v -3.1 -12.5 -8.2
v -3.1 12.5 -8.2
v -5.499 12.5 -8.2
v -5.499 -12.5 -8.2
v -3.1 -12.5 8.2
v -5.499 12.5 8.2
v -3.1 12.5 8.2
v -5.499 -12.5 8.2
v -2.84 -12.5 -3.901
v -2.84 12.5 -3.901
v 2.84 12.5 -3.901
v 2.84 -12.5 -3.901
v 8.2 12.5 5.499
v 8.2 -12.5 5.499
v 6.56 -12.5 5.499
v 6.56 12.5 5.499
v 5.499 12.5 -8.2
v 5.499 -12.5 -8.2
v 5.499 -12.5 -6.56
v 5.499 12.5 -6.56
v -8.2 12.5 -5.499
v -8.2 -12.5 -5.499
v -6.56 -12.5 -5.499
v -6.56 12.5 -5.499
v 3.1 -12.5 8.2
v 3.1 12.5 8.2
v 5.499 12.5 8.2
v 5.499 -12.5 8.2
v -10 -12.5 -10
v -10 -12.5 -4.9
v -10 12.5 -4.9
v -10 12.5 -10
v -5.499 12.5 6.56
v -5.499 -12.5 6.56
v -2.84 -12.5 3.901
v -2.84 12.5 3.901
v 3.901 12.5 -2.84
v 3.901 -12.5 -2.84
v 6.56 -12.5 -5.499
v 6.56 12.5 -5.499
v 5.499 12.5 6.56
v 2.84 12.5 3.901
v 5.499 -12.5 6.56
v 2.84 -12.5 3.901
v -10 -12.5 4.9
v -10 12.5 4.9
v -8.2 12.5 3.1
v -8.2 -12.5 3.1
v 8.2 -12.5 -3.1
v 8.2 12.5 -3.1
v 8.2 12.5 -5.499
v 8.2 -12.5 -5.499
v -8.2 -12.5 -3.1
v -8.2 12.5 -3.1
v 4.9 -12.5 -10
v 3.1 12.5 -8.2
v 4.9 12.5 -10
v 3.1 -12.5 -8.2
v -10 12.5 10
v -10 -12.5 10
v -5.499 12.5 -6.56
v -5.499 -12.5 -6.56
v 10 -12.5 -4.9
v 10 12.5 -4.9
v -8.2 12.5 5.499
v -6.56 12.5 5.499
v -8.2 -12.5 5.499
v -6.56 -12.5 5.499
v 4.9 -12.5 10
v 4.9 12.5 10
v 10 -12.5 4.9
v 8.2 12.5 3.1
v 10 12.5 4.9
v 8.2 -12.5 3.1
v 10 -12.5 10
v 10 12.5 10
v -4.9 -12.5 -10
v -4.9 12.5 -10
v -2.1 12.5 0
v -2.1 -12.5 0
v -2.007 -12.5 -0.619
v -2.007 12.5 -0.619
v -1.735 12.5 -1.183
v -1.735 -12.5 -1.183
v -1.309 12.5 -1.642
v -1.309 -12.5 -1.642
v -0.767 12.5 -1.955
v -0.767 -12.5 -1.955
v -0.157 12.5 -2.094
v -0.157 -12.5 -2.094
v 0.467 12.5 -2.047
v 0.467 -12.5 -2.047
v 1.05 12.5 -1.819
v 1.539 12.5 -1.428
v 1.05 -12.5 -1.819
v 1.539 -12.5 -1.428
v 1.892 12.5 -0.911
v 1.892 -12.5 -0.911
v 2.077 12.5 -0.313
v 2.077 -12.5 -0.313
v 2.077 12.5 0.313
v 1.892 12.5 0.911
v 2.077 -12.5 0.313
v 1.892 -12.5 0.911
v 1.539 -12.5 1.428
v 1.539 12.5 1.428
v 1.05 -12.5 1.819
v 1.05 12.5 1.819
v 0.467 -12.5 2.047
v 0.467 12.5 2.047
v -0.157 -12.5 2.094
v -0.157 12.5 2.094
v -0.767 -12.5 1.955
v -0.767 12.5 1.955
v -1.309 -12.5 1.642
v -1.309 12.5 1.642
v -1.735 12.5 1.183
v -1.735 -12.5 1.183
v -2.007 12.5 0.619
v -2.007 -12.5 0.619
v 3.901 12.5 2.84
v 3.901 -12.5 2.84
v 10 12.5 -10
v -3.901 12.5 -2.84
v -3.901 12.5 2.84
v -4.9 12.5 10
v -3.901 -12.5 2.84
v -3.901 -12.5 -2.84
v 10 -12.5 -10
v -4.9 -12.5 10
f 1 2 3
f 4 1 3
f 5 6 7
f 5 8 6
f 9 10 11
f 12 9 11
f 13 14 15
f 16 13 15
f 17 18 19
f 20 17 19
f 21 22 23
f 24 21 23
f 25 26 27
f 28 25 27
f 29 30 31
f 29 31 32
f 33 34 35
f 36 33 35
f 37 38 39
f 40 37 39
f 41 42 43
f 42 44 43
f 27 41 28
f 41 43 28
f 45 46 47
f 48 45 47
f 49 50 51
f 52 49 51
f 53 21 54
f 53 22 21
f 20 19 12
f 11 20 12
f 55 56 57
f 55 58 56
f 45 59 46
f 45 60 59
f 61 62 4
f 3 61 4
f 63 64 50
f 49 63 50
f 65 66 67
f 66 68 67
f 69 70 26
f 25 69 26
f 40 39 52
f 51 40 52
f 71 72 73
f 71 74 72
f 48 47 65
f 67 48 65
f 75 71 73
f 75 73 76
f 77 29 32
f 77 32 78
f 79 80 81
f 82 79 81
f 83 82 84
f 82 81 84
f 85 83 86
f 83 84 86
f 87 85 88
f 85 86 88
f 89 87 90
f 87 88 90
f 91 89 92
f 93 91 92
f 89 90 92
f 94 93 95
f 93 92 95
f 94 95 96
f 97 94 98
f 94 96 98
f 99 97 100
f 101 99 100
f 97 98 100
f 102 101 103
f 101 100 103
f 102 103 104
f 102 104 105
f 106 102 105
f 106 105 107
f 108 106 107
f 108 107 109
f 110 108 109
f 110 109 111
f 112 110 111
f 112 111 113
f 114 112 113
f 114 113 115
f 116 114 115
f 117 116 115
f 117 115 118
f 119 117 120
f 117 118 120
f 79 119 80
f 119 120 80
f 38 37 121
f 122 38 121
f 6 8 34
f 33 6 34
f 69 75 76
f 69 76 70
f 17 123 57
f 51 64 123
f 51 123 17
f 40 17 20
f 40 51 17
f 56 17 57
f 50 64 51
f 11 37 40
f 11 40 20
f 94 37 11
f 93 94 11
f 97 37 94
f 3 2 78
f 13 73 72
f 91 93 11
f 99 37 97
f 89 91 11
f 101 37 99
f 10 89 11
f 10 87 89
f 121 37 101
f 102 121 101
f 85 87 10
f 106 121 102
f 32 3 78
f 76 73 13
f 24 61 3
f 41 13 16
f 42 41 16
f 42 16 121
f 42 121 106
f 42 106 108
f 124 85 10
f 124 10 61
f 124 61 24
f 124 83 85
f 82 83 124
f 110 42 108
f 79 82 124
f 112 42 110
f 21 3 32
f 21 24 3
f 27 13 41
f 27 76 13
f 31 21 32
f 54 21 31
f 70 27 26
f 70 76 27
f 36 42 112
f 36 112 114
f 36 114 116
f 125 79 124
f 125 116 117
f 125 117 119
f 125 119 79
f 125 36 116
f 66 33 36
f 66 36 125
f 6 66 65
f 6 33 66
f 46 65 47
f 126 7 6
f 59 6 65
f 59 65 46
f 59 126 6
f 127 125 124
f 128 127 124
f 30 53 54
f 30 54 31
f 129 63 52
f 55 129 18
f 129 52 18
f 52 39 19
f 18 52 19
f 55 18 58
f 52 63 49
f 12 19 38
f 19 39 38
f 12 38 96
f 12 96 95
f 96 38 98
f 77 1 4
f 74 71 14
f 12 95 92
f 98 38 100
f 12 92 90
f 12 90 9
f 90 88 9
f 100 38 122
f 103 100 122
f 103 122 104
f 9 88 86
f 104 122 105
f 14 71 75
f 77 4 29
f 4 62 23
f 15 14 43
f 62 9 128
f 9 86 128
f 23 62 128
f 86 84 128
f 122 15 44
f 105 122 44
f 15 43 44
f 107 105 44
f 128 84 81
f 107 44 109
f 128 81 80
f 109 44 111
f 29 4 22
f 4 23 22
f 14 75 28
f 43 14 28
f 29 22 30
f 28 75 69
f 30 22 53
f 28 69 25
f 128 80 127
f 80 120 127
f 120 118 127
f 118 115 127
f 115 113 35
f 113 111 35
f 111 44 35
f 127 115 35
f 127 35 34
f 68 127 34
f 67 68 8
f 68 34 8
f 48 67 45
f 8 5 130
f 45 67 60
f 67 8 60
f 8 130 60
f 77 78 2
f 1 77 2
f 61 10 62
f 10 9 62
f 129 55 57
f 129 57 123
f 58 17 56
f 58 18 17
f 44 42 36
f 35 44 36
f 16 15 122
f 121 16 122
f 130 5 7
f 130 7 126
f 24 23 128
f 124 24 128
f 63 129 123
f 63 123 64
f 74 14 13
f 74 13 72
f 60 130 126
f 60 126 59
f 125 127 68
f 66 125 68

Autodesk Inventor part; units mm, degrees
ref_plane "YZ Plane" through (0, 0, 0) normal (1, 0, 0) x (0, 1, 0)
ref_plane "XZ Plane" through (0, 0, 0) normal (0, 1, 0) x (-1, 0, 0)
ref_plane "XY Plane" through (0, 0, 0) normal (0, 0, 1) x (1, 0, 0)
sketch "Sketch1" plane through (0, 0, 0) normal (0, 1, 0) x (-1, 0, 0)
  circle A0 centre (0, 0) radius 2.1
  line L0 (0, -3.9007) -> (-2.84, -3.9007)
  line L1 (-5.4993, -8.2) -> (-3.1, -8.2)
  line L2 (-3.1, -8.2) -> (-4.9, -10)
  line L3 (-4.9, -10) -> (-10, -10)
  line L4 (-10, -10) -> (-10, -4.9)
  line L5 (-10, -4.9) -> (-8.2, -3.1)
  line L6 (-8.2, -3.1) -> (-8.2, -5.4993)
  line L7 (-3.9007, -2.84) -> (-3.9007, 0)
  line L8 (-3.9007, 0) -> (-2.1, 0)
  line L9 (0, -3.9007) -> (0, -2.1) construction
  line L10 (-5.4993, -8.2) -> (-5.4993, -6.56)
  line L11 (-5.4993, -6.56) -> (-2.84, -3.9007)
  line L12 (-3.9007, -2.84) -> (-6.56, -5.4993)
  line L13 (-6.56, -5.4993) -> (-8.2, -5.4993)
  line L14 (6.56, -5.4993) -> (3.9007, -2.84)
  line L15 (3.1, -8.2) -> (5.4993, -8.2)
  line L16 (5.4993, -6.56) -> (5.4993, -8.2)
  line L17 (8.2, -5.4993) -> (8.2, -3.1)
  line L18 (8.2, -5.4993) -> (6.56, -5.4993)
  line L19 (8.2, -3.1) -> (10, -4.9)
  line L20 (4.9, -10) -> (3.1, -8.2)
  line L21 (10, -4.9) -> (10, -10)
  line L22 (10, -10) -> (4.9, -10)
  line L23 (2.84, -3.9007) -> (0, -3.9007)
  line L24 (0, -3.9007) -> (0, -2.1) construction
  line L25 (3.9007, 0) -> (2.1, 0)
  line L26 (3.9007, 0) -> (3.9007, -2.84)
  line L27 (2.84, -3.9007) -> (5.4993, -6.56)
  line L28 (5.4993, 6.56) -> (2.84, 3.9007)
  line L29 (8.2, 3.1) -> (8.2, 5.4993)
  line L30 (6.56, 5.4993) -> (8.2, 5.4993)
  line L31 (5.4993, 8.2) -> (3.1, 8.2)
  line L32 (5.4993, 8.2) -> (5.4993, 6.56)
  line L33 (3.1, 8.2) -> (4.9, 10)
  line L34 (10, 4.9) -> (8.2, 3.1)
  line L35 (4.9, 10) -> (10, 10)
  line L36 (10, 10) -> (10, 4.9)
  line L37 (3.9007, 2.84) -> (3.9007, 0)
  line L38 (3.9007, 0) -> (2.1, 0) construction
  line L39 (0, 3.9007) -> (0, 2.1)
  line L40 (0, 3.9007) -> (2.84, 3.9007)
  line L41 (3.9007, 2.84) -> (6.56, 5.4993)
  line L42 (-6.56, 5.4993) -> (-3.9007, 2.84)
  line L43 (-3.1, 8.2) -> (-5.4993, 8.2)
  line L44 (-5.4993, 6.56) -> (-5.4993, 8.2)
  line L45 (-8.2, 5.4993) -> (-8.2, 3.1)
  line L46 (-8.2, 5.4993) -> (-6.56, 5.4993)
  line L47 (-8.2, 3.1) -> (-10, 4.9)
  line L48 (-4.9, 10) -> (-3.1, 8.2)
  line L49 (-10, 4.9) -> (-10, 10)
  line L50 (-10, 10) -> (-4.9, 10)
  line L51 (-2.84, 3.9007) -> (0, 3.9007)
  line L52 (0, 3.9007) -> (0, 2.1) construction
  line L53 (-3.9007, 0) -> (-2.1, 0) construction
  line L54 (-3.9007, 0) -> (-3.9007, 2.84)
  line L55 (-2.84, 3.9007) -> (-5.4993, 6.56)
  point P0 (0, -3.0003)
  point P1 (-3.0003, 0)
  point P2 (0, -3.0003)
  point P3 (3.0003, 0)
  point P4 (3.0003, 0)
  point P5 (0, 3.0003)
  point P6 (0, 3.0003)
  point P7 (-3.0003, 0)
  dimension "d0" = 4.2
  dimension "d2" = 45
  dimension "d3" = 3.1
  dimension "d4" = 2.84
  dimension "d7" = 10
  dimension "d8" = 10
  dimension "d9" = 1.5
  dimension "d10" = 1.8
  dimension "d11" = 1.64
  dimension "d14" = 360
extrude "Extrusion1" add sketch "Sketch1" along normal mid plane 25 contours L25 L26 L14 L18 L17 L19 L21 L22 L20 L15 L16 L27 L23 L0 L11 L10 L1 L2 L3 L4 L5 L6 L13 L12 L7 L8 A0 | A0 L39 L40 L28 L32 L31 L33 L35 L36 L34 L29 L30 L41 L37 L25 | A0 L8 L54 L42 L46 L45 L47 L49 L50 L48 L43 L44 L55 L51 L39
properties part number "vslot_25mm" material "Aluminum 6061-AHC"
